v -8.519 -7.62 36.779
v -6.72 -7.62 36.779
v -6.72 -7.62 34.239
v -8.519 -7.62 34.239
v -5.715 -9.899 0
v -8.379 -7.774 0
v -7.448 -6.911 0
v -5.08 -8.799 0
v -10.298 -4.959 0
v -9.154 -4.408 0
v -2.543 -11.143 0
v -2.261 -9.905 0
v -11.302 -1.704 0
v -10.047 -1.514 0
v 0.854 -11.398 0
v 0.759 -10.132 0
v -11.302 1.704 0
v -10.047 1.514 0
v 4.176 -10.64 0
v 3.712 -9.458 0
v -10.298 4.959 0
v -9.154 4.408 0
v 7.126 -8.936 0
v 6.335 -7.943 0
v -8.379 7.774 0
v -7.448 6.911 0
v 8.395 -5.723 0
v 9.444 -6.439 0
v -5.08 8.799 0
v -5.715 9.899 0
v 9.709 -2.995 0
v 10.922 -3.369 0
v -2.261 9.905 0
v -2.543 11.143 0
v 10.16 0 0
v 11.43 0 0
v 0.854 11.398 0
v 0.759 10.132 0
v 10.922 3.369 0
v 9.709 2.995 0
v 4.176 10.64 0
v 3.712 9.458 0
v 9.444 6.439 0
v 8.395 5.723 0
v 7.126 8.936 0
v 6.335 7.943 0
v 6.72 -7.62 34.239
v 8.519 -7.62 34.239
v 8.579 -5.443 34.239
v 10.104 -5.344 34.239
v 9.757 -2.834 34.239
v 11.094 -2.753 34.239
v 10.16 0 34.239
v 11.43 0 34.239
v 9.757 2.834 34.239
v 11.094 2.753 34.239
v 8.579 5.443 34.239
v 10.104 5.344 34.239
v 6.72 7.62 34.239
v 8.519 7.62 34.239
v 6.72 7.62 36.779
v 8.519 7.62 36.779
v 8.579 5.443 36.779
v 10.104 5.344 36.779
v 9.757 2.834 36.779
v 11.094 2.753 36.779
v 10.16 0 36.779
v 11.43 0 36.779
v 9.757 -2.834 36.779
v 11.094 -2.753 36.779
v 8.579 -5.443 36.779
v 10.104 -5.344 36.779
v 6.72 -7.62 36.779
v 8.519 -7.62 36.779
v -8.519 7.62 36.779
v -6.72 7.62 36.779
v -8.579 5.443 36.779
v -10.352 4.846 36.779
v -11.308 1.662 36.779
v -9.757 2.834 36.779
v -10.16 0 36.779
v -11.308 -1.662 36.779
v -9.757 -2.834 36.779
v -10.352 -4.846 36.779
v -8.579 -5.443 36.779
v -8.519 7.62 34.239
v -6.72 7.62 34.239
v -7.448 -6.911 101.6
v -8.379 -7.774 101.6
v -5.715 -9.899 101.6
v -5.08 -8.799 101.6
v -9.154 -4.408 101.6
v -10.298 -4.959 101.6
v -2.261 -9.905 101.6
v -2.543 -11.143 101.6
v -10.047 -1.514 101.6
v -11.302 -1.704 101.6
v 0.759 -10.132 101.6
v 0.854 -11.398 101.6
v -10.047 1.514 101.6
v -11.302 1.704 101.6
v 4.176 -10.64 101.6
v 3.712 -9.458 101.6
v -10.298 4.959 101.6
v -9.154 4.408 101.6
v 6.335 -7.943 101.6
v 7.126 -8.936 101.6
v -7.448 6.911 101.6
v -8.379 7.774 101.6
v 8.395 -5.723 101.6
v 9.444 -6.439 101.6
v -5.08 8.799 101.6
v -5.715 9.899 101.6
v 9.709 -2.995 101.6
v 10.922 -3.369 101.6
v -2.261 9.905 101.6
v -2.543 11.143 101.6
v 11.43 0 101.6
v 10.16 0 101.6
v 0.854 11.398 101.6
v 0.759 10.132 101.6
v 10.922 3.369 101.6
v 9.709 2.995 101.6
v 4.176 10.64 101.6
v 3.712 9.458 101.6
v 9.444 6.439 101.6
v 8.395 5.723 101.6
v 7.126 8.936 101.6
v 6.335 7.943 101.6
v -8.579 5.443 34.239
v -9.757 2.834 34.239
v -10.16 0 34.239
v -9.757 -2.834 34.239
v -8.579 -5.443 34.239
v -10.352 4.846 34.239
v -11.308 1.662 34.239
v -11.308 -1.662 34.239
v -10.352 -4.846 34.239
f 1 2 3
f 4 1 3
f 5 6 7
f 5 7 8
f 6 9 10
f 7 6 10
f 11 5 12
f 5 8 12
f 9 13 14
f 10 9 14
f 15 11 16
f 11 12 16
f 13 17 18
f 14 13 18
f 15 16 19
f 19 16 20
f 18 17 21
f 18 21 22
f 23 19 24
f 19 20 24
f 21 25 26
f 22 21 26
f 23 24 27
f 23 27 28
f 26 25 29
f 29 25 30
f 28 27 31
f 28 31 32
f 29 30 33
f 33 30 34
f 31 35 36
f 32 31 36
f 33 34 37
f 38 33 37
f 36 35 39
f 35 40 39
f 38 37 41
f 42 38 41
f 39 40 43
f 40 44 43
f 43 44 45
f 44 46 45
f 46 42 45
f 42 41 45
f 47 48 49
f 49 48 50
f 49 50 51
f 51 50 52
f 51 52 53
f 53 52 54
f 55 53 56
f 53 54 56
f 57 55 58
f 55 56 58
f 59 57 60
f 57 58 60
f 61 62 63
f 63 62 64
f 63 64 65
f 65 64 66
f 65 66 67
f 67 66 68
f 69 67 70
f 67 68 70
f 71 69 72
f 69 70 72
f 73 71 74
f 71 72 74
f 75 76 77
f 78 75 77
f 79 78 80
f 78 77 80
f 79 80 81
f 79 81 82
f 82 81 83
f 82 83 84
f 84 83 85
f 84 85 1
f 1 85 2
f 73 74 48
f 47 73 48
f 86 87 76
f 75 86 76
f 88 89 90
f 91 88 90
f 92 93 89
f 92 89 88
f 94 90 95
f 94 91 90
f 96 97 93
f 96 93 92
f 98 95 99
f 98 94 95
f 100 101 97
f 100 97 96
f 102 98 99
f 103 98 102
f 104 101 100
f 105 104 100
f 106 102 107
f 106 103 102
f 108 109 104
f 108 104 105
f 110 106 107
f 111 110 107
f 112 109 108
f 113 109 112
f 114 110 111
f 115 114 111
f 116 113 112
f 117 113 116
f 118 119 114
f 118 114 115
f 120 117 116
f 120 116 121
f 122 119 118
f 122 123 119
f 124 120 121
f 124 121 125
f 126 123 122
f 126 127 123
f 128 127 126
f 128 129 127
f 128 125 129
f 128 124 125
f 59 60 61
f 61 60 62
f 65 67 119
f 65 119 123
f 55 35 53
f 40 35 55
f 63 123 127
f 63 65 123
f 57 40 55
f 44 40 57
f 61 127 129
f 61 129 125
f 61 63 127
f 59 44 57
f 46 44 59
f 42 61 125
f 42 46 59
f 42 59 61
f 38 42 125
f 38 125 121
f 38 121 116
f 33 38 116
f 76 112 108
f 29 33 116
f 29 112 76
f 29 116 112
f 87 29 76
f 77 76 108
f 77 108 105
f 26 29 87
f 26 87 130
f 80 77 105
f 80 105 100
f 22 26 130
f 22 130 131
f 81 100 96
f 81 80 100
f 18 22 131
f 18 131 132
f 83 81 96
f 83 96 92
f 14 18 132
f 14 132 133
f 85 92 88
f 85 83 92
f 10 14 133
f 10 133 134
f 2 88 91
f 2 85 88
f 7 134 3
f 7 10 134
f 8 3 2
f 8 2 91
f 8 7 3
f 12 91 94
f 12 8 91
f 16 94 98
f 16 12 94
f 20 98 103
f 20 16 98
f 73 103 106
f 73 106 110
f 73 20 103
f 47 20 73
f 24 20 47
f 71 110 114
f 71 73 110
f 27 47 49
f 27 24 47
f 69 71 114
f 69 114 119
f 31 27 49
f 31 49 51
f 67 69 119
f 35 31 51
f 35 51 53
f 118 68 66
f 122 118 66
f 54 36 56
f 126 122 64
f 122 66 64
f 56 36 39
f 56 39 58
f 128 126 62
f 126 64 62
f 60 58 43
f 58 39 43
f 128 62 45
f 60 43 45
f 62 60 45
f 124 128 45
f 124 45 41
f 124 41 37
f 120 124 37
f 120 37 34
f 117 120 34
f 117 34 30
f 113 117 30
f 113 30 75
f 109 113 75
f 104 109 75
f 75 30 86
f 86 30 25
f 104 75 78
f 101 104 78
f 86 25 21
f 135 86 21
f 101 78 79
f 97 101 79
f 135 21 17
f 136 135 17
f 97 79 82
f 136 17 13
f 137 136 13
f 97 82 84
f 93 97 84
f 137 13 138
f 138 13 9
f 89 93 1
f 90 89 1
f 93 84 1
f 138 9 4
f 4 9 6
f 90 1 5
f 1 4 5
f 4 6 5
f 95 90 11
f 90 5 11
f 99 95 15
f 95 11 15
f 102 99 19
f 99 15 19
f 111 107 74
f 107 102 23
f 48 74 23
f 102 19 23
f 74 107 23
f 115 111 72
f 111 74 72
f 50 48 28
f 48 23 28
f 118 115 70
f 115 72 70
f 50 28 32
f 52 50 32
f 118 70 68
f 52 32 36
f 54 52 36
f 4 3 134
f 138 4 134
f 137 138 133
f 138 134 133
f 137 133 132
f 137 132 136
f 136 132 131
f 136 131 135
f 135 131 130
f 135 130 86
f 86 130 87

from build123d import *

# Parameters (mm, degrees)
F0_R     = 11.43
F0_R_2   = 10.16
F1_DEPTH = 101.6
F3_DEPTH = 12.7


with BuildPart() as f1:
    # F0 (on Top) → F1 (new body)
    with BuildSketch(Plane.XY):
        Circle(F0_R)
        Circle(F0_R_2, mode=Mode.SUBTRACT)
    extrude(amount=F1_DEPTH)


with BuildPart() as f3:
    # F2 (on Right) → F3 (new body, symmetric)
    with BuildSketch(Plane.YZ):
        Polygon((-7.62, 34.2392), (0, 34.2392), (7.62, 34.2392), (7.62, 36.7792), (-7.62, 36.7792), align=None)
    extrude(amount=F3_DEPTH, both=True)


with BuildPart() as f1_1:
    add(f1.part)

    # F4: cut F3
    add(f3.part, mode=Mode.SUBTRACT)


solid = f1_1.part
